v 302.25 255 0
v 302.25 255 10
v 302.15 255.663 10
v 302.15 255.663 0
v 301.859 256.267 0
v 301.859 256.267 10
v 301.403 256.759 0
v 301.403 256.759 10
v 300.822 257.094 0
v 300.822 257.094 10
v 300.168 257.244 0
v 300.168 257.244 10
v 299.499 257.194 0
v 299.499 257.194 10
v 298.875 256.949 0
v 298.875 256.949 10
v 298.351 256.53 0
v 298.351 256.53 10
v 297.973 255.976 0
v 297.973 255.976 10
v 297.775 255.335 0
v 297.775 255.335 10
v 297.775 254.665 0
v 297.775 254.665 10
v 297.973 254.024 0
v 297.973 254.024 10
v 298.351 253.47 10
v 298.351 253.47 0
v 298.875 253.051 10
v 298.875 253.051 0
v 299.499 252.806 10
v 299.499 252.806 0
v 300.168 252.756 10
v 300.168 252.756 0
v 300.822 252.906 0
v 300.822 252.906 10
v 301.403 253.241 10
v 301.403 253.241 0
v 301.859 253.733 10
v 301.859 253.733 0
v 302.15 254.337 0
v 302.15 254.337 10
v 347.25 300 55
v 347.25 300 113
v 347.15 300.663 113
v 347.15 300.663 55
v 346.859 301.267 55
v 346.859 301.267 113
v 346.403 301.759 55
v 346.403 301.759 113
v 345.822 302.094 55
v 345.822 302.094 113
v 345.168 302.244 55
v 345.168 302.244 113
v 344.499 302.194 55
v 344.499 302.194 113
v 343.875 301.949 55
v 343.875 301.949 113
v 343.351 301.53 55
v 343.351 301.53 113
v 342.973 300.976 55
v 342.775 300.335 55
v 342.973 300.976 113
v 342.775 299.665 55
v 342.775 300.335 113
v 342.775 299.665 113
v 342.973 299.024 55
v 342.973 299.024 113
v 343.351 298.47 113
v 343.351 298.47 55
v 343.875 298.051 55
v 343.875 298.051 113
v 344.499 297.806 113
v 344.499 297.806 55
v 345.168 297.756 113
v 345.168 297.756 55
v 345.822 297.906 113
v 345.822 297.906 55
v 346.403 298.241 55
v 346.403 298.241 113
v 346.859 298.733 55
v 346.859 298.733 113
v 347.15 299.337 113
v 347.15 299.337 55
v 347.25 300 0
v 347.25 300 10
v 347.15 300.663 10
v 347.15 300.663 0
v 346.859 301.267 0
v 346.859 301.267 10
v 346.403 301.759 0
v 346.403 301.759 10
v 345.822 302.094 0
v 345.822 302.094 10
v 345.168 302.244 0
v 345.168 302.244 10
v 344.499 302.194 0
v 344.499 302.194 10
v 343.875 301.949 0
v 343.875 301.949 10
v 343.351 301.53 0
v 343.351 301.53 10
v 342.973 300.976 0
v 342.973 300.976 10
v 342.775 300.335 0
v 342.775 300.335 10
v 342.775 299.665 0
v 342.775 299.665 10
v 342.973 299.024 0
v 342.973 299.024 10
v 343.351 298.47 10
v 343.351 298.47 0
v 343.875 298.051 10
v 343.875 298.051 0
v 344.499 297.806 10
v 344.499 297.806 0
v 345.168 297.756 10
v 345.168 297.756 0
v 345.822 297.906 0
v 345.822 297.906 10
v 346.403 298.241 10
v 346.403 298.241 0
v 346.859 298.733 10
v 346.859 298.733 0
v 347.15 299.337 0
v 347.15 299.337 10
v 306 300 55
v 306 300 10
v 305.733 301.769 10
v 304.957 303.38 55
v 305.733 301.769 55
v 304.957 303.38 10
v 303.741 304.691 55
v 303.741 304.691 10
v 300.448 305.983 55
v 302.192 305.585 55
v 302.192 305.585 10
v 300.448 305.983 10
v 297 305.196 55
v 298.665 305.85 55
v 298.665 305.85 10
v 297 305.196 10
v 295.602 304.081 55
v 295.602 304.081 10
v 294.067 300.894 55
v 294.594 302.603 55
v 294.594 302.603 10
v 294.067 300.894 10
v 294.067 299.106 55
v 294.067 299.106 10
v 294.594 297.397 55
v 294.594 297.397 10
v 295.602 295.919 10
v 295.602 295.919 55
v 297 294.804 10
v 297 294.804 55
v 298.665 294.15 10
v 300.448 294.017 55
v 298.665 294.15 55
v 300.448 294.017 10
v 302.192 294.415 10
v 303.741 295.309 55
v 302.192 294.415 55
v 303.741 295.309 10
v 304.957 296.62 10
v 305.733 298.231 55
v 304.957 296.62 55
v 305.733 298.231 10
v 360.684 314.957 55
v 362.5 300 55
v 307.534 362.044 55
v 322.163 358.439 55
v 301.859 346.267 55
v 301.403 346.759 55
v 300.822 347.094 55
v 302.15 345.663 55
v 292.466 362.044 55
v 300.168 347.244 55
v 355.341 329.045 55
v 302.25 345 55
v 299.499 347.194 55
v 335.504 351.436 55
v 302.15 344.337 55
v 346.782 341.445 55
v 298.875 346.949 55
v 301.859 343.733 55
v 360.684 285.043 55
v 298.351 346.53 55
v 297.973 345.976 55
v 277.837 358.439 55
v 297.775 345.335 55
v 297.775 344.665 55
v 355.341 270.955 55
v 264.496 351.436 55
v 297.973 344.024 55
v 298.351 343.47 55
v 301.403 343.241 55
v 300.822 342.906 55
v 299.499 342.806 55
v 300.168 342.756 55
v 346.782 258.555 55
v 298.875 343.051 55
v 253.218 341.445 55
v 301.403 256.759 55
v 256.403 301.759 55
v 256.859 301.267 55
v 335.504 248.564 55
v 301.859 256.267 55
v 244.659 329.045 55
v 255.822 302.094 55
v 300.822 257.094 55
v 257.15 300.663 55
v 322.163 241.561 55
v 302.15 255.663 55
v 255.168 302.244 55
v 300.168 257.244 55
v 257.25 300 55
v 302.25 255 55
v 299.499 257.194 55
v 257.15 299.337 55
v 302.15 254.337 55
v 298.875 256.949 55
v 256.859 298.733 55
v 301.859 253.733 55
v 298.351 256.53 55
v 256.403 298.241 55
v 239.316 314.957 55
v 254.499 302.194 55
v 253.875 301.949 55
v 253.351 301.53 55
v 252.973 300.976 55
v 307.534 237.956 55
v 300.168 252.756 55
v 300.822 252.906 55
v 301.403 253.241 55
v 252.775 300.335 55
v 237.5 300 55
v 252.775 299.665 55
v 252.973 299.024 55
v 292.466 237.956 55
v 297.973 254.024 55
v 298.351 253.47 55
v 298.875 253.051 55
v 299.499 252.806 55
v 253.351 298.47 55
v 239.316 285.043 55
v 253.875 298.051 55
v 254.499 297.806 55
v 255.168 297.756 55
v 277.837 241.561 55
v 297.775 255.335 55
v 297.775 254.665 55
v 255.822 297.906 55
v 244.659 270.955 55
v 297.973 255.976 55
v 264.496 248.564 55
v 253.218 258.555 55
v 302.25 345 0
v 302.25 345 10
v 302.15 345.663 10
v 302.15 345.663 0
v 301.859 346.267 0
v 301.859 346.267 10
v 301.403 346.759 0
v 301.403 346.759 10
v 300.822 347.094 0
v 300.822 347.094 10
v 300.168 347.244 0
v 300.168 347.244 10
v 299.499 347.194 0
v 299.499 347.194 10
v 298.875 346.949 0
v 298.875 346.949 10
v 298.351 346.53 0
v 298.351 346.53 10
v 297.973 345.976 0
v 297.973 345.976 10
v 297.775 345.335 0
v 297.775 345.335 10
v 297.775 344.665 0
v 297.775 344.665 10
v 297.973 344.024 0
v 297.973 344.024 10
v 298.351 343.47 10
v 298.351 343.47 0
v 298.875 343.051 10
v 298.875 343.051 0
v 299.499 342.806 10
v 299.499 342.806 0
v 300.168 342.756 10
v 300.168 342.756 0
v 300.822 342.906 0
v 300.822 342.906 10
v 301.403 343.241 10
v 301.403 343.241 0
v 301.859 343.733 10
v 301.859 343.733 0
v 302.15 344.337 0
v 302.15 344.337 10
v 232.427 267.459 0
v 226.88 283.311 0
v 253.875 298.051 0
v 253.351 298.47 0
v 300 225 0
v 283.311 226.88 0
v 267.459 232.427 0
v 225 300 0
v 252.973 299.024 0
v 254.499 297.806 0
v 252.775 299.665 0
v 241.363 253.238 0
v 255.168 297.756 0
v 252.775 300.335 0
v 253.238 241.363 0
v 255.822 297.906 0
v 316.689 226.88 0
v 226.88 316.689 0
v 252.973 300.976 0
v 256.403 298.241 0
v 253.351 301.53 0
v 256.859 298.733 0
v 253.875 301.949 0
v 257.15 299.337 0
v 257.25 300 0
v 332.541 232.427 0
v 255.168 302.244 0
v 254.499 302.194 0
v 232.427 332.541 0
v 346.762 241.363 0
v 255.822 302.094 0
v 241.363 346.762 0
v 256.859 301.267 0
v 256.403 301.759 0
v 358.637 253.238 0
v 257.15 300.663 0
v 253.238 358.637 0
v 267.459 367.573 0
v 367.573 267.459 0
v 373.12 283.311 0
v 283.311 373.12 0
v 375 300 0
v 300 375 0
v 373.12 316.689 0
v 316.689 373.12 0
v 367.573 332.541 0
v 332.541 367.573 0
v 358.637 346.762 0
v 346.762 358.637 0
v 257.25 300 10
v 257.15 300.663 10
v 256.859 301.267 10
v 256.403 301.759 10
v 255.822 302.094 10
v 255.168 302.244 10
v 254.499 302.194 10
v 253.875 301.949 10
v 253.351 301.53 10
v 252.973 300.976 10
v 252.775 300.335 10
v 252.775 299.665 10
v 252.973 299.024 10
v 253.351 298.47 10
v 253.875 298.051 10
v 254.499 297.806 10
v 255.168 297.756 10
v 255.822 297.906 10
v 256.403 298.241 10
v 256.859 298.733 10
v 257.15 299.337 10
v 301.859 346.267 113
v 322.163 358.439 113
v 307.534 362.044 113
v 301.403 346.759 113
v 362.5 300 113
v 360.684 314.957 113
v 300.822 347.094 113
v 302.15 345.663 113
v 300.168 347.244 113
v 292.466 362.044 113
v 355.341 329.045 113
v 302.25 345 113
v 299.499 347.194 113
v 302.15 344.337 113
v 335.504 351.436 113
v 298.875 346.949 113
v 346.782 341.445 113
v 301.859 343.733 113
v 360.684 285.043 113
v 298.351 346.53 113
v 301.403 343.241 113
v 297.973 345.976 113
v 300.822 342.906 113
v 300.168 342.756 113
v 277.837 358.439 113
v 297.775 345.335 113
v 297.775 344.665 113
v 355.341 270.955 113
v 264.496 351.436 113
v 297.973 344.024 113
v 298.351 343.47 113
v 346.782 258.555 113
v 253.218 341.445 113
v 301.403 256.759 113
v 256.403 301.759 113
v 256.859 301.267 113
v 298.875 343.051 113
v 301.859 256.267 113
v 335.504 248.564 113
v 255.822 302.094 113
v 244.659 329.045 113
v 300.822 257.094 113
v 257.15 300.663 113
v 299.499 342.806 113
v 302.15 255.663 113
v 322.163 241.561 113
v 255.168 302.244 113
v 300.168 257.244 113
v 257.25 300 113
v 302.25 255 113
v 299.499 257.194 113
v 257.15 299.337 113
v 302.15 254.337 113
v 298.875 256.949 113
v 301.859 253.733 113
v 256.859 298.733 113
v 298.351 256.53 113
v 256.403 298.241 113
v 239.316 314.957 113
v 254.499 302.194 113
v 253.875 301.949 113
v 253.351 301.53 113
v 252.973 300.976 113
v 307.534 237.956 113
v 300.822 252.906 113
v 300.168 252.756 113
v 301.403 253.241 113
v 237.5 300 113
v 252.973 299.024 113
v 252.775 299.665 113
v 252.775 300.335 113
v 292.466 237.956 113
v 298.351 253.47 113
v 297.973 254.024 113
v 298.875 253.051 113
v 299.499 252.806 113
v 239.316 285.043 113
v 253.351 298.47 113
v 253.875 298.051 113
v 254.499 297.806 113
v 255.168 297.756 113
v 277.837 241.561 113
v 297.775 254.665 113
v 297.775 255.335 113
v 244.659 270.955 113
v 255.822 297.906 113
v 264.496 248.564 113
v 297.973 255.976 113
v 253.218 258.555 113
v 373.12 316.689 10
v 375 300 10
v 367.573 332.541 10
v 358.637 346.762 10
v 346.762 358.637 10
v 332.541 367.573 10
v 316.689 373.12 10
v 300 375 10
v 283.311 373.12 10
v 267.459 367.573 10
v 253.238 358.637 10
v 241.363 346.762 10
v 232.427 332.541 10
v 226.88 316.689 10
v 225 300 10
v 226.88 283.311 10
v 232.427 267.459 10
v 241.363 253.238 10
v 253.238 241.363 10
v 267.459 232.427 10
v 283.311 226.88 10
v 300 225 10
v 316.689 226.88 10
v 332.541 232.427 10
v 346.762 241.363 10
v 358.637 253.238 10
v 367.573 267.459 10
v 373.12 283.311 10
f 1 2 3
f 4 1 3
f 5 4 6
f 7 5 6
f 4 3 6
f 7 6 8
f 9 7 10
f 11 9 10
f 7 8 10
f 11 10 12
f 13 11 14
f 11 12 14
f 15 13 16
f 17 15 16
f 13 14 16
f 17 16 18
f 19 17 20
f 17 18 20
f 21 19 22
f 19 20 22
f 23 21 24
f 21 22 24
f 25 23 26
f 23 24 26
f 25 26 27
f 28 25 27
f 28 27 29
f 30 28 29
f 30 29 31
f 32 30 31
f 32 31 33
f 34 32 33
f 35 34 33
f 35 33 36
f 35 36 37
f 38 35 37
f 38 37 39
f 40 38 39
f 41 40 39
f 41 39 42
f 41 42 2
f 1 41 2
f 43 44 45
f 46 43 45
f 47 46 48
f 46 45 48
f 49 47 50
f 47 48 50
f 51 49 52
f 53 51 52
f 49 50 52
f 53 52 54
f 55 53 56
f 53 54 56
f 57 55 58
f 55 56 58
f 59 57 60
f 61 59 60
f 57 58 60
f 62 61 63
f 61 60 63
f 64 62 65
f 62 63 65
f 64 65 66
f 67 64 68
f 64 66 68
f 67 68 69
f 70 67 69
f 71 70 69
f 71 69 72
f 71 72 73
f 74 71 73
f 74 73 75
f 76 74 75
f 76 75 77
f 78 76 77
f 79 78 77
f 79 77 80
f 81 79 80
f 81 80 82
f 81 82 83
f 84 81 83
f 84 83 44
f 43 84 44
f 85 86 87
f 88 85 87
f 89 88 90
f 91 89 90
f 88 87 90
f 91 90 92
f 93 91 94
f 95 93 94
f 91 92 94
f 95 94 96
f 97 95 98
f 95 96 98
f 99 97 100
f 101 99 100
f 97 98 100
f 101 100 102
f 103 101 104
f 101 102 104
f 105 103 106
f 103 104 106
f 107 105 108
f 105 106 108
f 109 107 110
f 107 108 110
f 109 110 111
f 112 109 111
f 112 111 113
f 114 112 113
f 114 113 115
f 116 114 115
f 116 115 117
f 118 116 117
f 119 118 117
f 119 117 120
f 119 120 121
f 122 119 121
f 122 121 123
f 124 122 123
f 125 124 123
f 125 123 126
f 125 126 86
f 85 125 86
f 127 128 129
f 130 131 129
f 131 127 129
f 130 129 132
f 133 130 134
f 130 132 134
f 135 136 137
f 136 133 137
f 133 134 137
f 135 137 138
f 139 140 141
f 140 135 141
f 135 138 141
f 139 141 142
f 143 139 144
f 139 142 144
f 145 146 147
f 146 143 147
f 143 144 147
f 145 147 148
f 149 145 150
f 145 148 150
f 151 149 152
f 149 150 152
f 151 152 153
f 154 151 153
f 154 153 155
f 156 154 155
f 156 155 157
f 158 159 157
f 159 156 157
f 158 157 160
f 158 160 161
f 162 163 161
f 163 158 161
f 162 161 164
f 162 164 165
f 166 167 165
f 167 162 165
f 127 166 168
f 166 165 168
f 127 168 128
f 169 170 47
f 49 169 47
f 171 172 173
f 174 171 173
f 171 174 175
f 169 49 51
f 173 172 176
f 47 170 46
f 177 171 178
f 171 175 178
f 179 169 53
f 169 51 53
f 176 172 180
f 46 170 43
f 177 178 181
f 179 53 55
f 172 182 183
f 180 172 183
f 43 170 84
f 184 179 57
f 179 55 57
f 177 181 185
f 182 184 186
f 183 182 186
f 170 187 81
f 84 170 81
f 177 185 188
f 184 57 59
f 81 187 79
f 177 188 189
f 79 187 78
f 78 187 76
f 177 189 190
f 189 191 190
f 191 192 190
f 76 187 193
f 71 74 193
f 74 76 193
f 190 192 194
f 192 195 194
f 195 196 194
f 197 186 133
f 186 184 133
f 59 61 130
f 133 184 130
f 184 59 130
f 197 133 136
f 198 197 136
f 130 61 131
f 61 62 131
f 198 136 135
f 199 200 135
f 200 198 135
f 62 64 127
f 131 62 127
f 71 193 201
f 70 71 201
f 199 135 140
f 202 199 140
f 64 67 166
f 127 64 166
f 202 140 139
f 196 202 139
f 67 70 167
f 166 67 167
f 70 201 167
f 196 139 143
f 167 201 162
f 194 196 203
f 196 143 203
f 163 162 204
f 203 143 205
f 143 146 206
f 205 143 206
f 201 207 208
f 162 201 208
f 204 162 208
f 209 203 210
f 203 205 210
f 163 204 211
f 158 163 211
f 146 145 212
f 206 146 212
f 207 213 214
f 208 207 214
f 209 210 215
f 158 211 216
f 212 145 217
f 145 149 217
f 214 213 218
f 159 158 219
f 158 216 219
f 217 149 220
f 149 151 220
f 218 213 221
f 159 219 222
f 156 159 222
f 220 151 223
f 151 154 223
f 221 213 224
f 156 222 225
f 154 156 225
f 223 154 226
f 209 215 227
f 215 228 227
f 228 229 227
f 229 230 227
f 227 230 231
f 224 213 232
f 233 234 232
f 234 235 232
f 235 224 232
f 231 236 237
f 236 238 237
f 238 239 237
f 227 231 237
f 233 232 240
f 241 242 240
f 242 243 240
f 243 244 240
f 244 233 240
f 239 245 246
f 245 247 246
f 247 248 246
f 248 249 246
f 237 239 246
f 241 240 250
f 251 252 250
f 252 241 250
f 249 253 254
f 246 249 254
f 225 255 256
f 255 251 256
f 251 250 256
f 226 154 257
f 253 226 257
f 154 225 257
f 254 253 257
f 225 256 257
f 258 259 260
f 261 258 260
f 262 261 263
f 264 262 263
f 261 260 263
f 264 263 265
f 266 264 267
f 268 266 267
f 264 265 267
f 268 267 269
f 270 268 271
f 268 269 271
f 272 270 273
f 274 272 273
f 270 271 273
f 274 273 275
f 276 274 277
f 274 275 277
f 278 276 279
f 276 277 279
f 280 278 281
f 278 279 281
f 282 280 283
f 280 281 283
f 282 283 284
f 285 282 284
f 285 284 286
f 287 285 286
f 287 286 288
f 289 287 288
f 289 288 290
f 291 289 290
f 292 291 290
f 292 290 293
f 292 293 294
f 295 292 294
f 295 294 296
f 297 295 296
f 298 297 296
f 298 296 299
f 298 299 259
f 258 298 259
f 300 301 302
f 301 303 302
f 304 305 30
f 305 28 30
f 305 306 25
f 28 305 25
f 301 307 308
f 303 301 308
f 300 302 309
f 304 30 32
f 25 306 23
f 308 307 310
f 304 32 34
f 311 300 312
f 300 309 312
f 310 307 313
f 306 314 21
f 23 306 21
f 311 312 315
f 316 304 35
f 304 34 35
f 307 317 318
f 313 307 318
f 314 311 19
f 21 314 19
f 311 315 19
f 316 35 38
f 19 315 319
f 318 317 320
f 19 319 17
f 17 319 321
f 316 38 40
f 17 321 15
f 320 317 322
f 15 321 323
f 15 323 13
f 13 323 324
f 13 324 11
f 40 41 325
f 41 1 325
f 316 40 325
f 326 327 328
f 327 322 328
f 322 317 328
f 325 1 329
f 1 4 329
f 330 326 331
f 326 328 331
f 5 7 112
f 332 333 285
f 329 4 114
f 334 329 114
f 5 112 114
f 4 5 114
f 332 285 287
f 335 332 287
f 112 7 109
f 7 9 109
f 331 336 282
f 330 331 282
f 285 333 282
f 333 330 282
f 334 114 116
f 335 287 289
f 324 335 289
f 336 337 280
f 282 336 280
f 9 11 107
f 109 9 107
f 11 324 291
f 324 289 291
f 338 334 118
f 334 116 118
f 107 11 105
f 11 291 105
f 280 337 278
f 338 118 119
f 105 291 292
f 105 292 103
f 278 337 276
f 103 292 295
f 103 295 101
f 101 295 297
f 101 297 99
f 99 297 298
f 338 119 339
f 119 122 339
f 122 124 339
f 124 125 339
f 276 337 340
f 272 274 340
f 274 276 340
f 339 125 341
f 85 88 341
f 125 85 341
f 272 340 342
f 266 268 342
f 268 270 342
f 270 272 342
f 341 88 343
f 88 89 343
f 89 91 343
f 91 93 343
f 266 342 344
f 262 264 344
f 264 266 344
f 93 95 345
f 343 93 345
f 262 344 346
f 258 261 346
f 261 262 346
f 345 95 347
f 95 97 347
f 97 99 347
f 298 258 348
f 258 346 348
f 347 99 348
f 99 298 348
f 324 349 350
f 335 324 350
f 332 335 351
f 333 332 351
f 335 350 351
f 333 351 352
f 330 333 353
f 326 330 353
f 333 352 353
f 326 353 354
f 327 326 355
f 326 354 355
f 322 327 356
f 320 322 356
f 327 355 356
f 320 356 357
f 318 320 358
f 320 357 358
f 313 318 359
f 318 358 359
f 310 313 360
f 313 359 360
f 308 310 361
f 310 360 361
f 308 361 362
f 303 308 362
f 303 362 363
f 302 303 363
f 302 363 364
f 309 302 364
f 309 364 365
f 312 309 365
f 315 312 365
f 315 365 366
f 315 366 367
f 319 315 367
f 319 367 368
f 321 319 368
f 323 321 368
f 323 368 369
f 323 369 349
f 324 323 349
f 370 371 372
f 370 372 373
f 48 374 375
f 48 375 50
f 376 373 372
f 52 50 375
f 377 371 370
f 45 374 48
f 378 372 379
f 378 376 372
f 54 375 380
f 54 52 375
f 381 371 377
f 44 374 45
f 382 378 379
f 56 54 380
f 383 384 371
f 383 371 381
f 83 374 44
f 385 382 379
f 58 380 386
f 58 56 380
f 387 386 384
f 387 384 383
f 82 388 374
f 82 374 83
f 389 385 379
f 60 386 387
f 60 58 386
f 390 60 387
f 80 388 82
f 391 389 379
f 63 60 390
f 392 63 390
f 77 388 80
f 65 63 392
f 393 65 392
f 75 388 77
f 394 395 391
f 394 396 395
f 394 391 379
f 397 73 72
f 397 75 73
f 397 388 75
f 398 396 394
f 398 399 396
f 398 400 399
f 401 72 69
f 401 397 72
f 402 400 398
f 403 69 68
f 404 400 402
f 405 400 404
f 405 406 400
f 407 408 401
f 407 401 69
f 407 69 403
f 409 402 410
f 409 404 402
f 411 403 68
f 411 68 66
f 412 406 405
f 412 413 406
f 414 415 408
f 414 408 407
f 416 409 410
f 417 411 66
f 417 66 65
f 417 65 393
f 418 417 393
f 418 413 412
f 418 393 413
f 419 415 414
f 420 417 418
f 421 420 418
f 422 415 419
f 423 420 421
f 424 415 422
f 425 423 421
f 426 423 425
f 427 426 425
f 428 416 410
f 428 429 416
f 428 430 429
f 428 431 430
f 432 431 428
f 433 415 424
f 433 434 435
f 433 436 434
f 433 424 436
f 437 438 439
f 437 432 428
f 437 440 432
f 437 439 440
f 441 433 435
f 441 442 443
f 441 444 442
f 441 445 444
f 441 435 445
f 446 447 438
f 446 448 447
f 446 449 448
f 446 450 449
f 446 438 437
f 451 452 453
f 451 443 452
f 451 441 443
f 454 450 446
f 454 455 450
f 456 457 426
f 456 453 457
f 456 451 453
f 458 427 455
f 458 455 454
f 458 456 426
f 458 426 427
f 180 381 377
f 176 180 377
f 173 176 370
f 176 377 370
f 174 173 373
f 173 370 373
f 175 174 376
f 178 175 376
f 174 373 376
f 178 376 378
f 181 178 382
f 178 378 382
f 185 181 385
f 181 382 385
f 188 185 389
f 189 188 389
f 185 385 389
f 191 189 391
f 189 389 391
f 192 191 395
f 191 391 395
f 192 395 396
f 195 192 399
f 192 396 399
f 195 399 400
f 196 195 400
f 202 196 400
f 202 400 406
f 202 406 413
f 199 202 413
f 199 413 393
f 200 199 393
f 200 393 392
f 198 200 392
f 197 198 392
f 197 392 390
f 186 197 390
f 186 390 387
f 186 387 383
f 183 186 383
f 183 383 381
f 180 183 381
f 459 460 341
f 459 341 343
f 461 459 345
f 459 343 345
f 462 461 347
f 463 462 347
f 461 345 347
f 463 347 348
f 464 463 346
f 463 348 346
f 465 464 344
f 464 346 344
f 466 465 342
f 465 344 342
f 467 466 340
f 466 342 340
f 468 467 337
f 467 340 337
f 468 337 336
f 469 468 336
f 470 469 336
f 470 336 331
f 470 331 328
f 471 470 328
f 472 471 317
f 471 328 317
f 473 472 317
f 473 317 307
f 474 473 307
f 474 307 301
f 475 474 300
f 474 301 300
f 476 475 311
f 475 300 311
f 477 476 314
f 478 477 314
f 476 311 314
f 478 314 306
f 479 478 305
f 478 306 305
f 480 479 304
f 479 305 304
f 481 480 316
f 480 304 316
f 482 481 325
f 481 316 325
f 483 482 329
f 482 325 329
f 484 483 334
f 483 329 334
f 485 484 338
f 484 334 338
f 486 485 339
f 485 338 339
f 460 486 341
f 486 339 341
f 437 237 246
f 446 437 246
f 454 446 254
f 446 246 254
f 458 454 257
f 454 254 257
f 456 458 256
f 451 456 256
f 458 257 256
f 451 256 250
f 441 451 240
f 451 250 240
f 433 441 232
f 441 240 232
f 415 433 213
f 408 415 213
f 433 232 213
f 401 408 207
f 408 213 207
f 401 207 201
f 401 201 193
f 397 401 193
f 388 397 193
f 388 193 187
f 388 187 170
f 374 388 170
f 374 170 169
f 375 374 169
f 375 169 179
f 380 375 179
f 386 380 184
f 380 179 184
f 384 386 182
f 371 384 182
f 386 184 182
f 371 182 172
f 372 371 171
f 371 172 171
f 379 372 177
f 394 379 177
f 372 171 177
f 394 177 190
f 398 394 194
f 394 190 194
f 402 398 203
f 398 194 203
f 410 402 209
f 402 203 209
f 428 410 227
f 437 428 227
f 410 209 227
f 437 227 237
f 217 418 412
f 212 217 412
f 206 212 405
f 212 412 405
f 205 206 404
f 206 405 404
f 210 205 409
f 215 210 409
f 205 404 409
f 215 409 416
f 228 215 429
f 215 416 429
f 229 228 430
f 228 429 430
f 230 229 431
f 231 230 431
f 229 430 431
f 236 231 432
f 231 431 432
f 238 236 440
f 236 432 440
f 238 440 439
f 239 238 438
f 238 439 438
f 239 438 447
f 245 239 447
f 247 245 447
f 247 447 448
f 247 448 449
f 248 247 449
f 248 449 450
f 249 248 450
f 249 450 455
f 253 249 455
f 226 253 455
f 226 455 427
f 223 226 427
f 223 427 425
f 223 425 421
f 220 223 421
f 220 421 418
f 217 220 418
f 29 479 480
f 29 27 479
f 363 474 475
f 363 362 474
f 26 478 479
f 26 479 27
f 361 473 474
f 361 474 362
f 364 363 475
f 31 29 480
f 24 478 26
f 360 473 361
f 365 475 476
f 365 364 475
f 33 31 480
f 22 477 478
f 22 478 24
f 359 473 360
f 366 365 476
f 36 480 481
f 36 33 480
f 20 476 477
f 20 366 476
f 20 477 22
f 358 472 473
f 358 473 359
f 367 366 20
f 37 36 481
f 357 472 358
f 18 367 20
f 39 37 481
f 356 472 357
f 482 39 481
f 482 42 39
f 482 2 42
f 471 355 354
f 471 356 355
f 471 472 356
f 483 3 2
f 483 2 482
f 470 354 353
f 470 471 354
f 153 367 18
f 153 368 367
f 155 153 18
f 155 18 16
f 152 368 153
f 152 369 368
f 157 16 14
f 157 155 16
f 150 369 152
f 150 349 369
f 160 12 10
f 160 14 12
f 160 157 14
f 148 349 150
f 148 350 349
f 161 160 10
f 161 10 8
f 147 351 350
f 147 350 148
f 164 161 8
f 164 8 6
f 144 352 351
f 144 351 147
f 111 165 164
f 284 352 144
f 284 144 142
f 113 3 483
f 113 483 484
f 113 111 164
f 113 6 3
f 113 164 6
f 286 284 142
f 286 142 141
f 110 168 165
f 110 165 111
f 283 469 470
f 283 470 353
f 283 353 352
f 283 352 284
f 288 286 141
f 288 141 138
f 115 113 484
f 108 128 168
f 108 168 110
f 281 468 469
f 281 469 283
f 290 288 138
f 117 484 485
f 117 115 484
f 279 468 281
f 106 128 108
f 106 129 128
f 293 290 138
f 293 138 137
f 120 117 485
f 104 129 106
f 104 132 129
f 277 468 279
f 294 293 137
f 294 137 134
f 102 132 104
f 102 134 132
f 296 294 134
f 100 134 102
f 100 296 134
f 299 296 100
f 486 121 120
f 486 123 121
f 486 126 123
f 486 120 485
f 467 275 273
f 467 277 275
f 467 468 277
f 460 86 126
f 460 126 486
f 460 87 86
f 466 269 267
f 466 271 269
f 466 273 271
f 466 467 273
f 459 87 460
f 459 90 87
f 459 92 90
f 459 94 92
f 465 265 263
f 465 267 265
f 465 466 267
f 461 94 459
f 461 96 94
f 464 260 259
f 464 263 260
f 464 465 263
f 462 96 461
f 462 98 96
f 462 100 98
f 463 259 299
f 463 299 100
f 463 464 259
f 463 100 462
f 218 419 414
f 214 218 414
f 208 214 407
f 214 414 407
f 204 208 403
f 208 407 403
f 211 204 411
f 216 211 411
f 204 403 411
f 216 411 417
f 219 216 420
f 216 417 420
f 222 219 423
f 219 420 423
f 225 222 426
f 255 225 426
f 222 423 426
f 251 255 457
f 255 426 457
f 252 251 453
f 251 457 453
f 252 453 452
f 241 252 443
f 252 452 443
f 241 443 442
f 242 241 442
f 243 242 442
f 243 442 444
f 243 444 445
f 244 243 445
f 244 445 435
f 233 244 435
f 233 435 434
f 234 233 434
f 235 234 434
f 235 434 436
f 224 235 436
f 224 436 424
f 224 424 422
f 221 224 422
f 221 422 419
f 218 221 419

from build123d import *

# Parameters (mm, degrees)
SKETCH1_R           = 62.5
BOSS_EXTRUDE1_DEPTH = 58
SKETCH2_R           = 6
BOSS_EXTRUDE2_DEPTH = 113
SKETCH3_R           = 75
BOSS_EXTRUDE3_DEPTH = 10
SKETCH4_R           = 2.25
CUT_EXTRUDE1_DEPTH  = 133
SKETCH5_R           = 2.25
CUT_EXTRUDE2_DEPTH  = 133
SKETCH6_R           = 2.25
CUT_EXTRUDE3_DEPTH  = 133
SKETCH7_R           = 2.25
CUT_EXTRUDE4_DEPTH  = 133


with BuildPart() as part:
    # Sketch1 → Boss-Extrude1 (new body)
    with BuildSketch(Plane.XY.offset(55)):
        with Locations(Location((300, 300, 0), (0, 0, 180))):
            Circle(SKETCH1_R)
    extrude(amount=BOSS_EXTRUDE1_DEPTH)

    # Sketch2 → Boss-Extrude2 (add)
    with BuildSketch(Plane.XY):
        with Locations((300, 300)):
            Circle(SKETCH2_R)
    extrude(amount=BOSS_EXTRUDE2_DEPTH)

    # Sketch3 → Boss-Extrude3 (add)
    with BuildSketch(Plane.XY):
        with Locations((300, 300)):
            Circle(SKETCH3_R)
    extrude(amount=BOSS_EXTRUDE3_DEPTH)

    # Sketch4 → Cut-Extrude1 (cut)
    with BuildSketch(Plane.XY.offset(113)):
        with Locations((345, 300)):
            Circle(SKETCH4_R)
    extrude(amount=-CUT_EXTRUDE1_DEPTH, mode=Mode.SUBTRACT)

    # Sketch5 → Cut-Extrude2 (cut)
    with BuildSketch(Plane.XY.offset(113)):
        with Locations((255, 300)):
            Circle(SKETCH5_R)
    extrude(amount=-CUT_EXTRUDE2_DEPTH, mode=Mode.SUBTRACT)

    # Sketch6 → Cut-Extrude3 (cut)
    with BuildSketch(Plane.XY.offset(113)):
        with Locations((300, 345)):
            Circle(SKETCH6_R)
    extrude(amount=-CUT_EXTRUDE3_DEPTH, mode=Mode.SUBTRACT)

    # Sketch7 → Cut-Extrude4 (cut)
    with BuildSketch(Plane.XY.offset(113)):
        with Locations((300, 255)):
            Circle(SKETCH7_R)
    extrude(amount=-CUT_EXTRUDE4_DEPTH, mode=Mode.SUBTRACT)


solid = part.part
